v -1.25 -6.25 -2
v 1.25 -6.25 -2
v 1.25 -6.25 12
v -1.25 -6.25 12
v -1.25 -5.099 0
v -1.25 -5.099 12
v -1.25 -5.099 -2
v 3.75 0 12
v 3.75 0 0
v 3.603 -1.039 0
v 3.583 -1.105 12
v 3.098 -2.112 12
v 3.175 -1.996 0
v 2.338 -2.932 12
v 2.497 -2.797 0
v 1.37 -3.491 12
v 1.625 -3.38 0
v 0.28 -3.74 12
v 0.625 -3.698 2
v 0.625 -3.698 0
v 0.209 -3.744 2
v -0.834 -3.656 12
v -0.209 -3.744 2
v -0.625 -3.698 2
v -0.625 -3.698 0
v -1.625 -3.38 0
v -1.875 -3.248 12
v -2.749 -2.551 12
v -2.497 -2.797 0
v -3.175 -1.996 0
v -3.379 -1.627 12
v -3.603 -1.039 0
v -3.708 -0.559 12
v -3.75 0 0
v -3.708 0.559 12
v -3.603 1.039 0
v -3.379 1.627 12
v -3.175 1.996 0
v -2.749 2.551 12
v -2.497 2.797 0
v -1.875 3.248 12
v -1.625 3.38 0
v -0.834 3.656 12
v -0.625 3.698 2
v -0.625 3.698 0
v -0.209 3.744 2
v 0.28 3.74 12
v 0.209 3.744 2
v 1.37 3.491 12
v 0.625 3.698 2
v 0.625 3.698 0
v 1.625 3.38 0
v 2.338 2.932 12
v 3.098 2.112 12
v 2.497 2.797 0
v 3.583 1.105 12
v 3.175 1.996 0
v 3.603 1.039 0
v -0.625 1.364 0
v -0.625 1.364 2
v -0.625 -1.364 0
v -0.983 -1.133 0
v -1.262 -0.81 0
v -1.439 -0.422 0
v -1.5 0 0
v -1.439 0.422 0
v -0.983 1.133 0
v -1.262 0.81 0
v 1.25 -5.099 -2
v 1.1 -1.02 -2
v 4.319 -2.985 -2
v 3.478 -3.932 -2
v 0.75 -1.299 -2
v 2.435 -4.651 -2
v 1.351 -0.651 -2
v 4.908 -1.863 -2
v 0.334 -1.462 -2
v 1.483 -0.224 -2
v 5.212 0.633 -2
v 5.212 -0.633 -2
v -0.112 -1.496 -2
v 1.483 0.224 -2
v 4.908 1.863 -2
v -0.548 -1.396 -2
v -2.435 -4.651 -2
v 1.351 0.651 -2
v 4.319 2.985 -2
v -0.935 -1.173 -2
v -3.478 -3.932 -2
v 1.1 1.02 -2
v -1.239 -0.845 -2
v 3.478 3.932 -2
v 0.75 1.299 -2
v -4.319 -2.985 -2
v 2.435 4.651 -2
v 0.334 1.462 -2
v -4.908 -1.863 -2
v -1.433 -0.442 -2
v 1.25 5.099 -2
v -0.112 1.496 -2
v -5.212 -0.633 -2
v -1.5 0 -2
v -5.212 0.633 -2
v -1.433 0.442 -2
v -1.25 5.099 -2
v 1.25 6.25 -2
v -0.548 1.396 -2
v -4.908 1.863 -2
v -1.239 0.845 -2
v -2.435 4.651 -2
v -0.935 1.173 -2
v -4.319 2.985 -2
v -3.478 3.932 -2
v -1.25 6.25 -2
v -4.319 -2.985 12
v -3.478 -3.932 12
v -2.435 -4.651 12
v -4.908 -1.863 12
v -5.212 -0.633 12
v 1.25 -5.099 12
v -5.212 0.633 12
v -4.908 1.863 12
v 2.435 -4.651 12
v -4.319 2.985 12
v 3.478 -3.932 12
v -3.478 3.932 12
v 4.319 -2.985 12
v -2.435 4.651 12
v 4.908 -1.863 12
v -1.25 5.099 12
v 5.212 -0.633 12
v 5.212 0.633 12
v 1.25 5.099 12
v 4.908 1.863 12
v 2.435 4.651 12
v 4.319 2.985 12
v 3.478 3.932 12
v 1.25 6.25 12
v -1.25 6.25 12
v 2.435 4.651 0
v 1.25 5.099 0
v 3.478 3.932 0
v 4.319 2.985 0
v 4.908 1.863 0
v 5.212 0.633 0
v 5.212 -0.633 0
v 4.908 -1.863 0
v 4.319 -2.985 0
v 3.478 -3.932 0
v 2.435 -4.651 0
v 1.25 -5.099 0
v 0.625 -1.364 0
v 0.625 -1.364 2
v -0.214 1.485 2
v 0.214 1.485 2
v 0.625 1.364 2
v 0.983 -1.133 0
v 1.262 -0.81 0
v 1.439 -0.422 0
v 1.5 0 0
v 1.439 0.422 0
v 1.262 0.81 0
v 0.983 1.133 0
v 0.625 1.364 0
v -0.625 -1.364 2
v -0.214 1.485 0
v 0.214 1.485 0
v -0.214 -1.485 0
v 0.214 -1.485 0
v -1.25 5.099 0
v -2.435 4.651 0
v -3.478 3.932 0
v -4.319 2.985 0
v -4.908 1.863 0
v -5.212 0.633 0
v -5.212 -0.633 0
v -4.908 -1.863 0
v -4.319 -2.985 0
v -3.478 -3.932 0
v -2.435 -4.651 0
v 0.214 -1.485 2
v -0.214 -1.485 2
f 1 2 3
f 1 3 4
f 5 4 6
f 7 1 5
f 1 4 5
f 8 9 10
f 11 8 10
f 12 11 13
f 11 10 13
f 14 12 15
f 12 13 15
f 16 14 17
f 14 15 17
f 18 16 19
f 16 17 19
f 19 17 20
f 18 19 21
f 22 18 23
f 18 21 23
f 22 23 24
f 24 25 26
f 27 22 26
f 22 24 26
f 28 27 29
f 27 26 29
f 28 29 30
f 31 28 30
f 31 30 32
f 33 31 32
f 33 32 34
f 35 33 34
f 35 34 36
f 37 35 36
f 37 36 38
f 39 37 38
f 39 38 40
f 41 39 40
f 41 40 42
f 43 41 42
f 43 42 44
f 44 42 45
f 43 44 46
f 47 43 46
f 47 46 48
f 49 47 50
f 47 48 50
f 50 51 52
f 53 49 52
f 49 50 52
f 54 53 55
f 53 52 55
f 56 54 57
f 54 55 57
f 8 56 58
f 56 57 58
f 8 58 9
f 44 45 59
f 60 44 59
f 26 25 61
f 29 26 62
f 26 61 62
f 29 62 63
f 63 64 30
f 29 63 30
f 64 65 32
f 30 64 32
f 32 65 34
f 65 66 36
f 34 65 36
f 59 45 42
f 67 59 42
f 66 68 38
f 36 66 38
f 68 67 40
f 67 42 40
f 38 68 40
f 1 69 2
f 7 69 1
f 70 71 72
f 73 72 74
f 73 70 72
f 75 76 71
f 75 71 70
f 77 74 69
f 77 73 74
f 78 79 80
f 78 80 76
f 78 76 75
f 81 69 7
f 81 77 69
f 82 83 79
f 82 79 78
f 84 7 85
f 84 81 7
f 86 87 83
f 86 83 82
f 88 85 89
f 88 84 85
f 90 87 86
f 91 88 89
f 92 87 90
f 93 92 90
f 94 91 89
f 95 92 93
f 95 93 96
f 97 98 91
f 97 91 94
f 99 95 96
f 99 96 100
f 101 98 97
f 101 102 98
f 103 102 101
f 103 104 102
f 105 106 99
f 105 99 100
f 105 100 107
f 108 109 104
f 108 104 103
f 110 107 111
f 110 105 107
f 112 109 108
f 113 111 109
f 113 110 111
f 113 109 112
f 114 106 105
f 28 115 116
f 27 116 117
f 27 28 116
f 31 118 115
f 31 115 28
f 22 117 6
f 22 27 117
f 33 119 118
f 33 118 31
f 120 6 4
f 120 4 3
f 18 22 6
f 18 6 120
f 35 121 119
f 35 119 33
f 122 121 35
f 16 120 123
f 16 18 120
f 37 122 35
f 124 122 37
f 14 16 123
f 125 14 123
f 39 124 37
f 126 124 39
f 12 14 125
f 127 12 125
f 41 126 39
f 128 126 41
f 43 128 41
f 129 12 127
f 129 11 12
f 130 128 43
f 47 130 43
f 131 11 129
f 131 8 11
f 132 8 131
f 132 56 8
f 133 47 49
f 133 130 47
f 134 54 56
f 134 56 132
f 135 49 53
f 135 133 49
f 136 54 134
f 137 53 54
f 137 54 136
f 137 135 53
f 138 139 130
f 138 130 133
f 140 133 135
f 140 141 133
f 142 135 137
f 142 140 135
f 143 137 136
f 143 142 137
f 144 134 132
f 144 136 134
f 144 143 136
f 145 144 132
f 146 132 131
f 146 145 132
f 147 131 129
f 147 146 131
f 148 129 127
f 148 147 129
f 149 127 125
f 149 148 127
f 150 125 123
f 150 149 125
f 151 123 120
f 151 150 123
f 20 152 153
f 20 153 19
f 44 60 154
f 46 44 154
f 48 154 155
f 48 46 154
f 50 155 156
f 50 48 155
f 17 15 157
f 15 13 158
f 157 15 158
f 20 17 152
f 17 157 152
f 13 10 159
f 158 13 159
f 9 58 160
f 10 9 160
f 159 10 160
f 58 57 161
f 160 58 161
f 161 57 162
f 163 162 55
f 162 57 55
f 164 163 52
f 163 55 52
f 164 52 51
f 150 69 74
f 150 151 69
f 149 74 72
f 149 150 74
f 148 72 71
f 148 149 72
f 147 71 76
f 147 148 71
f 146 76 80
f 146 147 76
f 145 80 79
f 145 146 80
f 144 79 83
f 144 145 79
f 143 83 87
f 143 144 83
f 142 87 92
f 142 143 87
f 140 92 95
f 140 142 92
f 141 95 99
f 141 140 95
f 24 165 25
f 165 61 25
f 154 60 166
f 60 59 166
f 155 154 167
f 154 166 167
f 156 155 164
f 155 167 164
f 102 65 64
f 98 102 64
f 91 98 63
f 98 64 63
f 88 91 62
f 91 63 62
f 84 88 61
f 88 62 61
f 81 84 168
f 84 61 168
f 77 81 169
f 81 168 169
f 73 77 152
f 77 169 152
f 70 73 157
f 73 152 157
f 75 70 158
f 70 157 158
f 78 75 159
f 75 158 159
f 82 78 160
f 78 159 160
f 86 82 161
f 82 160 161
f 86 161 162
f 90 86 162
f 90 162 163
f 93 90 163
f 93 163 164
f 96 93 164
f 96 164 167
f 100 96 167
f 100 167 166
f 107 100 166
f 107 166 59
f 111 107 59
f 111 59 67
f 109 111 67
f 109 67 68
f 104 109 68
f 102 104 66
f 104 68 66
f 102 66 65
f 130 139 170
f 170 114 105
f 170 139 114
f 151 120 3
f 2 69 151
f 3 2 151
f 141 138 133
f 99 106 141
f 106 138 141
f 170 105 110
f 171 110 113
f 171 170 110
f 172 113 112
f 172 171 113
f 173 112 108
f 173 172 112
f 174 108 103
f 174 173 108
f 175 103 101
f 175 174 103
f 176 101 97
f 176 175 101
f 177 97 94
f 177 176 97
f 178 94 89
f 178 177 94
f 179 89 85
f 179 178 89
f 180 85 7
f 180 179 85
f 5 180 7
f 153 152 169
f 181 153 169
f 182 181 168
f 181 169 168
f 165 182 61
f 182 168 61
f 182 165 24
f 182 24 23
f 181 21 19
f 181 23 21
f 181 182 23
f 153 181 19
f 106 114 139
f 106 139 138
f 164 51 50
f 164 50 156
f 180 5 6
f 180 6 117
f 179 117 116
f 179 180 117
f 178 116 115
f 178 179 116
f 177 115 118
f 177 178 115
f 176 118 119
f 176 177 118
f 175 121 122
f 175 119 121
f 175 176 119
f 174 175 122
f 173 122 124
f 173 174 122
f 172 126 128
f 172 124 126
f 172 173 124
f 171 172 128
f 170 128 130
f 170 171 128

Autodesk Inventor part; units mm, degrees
ref_plane "YZ Plane" through (0, 0, 0) normal (1, 0, 0) x (0, 1, 0)
ref_plane "XZ Plane" through (0, 0, 0) normal (0, 1, 0) x (-1, 0, 0)
ref_plane "XY Plane" through (0, 0, 0) normal (0, 0, 1) x (1, 0, 0)
sketch "Sketch1" plane through (0, 0, 0) normal (0, 0, 1) x (1, 0, 0)
  circle A0 centre (0, 0) radius 3.75
  line L0 (1.25, -6.25) -> (-1.25, -6.25)
  line L1 (-1.25, -6.25) -> (-1.25, 6.25) construction
  line L2 (-1.25, 6.25) -> (1.25, 6.25)
  line L3 (1.25, 6.25) -> (1.25, -6.25) construction
  circle A1 centre (0, 0) radius 5.25
  line L4 (1.25, -5.099) -> (1.25, -6.25)
  line L5 (-1.25, -6.25) -> (-1.25, -5.099)
  line L6 (-1.25, 6.25) -> (-1.25, 5.099)
  line L7 (1.25, 6.25) -> (1.25, 5.099)
  arc A2 (-1.25, -5.099) -> (1.25, -5.099) centre (0, 0) ccw
  arc A3 (1.25, 5.099) -> (-1.25, 5.099) centre (0, 0) ccw
  point P0 (0, 6.25)
  point P1 (1.25, 0)
  dimension "d1" = 7.5
  dimension "d10" = 2.5
  dimension "d11" = 12.5
  dimension "d12" = 10.5
extrude "Extrusion1" add sketch "Sketch1" along normal blind 12
sketch "Sketch5" plane through (0, 0, 0) normal (0, 0, -1) x (-1, 0, 0)
  circle A0 centre (0, 0) radius 3.75 projected
  circle A1 centre (0, 0) radius 3.75 projected
  line L0 (-1.25, -6.25) -> (-1.25, -5.099) projected
  line L1 (1.25, -6.25) -> (-1.25, -6.25) projected
  line L2 (1.25, -5.099) -> (1.25, -6.25) projected
  arc A2 (1.25, -5.099) -> (1.25, 5.099) centre (0, 0) ccw projected
  line L3 (1.25, 6.25) -> (1.25, 5.099) projected
  line L4 (-1.25, 6.25) -> (1.25, 6.25) projected
  line L5 (-1.25, 5.099) -> (-1.25, 6.25) projected
  arc A3 (-1.25, 5.099) -> (-1.25, -5.099) centre (0, 0) ccw projected
  circle A4 centre (0, 0) radius 1.5
  dimension "d13" = 3
extrude "Extrusion4" add sketch "Sketch5" along normal blind 2 contours A0 | L0 A3 L5 L4 L3 A2 L2 L1
sketch "Sketch6" plane through (0, 0, 0) normal (0, 0, 1) x (1, 0, 0)
  line L0 (0.625, 6.25) -> (-0.625, 6.25)
  line L1 (-0.625, 6.25) -> (-0.625, -6.25) construction
  line L2 (-0.625, -6.25) -> (0.625, -6.25)
  line L3 (0.625, -6.25) -> (0.625, 6.25) construction
  line L4 (-1.25, 6.25) -> (1.25, 6.25) projected
  circle A0 centre (0, 0) radius 1.5 construction
  arc A1 (0.625, 1.3636) -> (-0.625, 1.3636) centre (0, 0) ccw
  arc A2 (-0.625, -1.3636) -> (0.625, -1.3636) centre (0, 0) ccw
  line L5 (0.625, 6.25) -> (0.625, 1.3636)
  line L6 (-0.625, 6.25) -> (-0.625, 1.3636)
  line L7 (0.625, -1.3636) -> (0.625, -6.25)
  line L8 (-0.625, -1.3636) -> (-0.625, -6.25)
  point P0 (0, 0)
  point P1 (0, 6.25)
  point P2 (0.625, 0)
  dimension "d16" = 1.25
extrude "Extrusion5" add sketch "Sketch6" along normal blind 2
properties part number "AA042" material "ABS Plastic"
